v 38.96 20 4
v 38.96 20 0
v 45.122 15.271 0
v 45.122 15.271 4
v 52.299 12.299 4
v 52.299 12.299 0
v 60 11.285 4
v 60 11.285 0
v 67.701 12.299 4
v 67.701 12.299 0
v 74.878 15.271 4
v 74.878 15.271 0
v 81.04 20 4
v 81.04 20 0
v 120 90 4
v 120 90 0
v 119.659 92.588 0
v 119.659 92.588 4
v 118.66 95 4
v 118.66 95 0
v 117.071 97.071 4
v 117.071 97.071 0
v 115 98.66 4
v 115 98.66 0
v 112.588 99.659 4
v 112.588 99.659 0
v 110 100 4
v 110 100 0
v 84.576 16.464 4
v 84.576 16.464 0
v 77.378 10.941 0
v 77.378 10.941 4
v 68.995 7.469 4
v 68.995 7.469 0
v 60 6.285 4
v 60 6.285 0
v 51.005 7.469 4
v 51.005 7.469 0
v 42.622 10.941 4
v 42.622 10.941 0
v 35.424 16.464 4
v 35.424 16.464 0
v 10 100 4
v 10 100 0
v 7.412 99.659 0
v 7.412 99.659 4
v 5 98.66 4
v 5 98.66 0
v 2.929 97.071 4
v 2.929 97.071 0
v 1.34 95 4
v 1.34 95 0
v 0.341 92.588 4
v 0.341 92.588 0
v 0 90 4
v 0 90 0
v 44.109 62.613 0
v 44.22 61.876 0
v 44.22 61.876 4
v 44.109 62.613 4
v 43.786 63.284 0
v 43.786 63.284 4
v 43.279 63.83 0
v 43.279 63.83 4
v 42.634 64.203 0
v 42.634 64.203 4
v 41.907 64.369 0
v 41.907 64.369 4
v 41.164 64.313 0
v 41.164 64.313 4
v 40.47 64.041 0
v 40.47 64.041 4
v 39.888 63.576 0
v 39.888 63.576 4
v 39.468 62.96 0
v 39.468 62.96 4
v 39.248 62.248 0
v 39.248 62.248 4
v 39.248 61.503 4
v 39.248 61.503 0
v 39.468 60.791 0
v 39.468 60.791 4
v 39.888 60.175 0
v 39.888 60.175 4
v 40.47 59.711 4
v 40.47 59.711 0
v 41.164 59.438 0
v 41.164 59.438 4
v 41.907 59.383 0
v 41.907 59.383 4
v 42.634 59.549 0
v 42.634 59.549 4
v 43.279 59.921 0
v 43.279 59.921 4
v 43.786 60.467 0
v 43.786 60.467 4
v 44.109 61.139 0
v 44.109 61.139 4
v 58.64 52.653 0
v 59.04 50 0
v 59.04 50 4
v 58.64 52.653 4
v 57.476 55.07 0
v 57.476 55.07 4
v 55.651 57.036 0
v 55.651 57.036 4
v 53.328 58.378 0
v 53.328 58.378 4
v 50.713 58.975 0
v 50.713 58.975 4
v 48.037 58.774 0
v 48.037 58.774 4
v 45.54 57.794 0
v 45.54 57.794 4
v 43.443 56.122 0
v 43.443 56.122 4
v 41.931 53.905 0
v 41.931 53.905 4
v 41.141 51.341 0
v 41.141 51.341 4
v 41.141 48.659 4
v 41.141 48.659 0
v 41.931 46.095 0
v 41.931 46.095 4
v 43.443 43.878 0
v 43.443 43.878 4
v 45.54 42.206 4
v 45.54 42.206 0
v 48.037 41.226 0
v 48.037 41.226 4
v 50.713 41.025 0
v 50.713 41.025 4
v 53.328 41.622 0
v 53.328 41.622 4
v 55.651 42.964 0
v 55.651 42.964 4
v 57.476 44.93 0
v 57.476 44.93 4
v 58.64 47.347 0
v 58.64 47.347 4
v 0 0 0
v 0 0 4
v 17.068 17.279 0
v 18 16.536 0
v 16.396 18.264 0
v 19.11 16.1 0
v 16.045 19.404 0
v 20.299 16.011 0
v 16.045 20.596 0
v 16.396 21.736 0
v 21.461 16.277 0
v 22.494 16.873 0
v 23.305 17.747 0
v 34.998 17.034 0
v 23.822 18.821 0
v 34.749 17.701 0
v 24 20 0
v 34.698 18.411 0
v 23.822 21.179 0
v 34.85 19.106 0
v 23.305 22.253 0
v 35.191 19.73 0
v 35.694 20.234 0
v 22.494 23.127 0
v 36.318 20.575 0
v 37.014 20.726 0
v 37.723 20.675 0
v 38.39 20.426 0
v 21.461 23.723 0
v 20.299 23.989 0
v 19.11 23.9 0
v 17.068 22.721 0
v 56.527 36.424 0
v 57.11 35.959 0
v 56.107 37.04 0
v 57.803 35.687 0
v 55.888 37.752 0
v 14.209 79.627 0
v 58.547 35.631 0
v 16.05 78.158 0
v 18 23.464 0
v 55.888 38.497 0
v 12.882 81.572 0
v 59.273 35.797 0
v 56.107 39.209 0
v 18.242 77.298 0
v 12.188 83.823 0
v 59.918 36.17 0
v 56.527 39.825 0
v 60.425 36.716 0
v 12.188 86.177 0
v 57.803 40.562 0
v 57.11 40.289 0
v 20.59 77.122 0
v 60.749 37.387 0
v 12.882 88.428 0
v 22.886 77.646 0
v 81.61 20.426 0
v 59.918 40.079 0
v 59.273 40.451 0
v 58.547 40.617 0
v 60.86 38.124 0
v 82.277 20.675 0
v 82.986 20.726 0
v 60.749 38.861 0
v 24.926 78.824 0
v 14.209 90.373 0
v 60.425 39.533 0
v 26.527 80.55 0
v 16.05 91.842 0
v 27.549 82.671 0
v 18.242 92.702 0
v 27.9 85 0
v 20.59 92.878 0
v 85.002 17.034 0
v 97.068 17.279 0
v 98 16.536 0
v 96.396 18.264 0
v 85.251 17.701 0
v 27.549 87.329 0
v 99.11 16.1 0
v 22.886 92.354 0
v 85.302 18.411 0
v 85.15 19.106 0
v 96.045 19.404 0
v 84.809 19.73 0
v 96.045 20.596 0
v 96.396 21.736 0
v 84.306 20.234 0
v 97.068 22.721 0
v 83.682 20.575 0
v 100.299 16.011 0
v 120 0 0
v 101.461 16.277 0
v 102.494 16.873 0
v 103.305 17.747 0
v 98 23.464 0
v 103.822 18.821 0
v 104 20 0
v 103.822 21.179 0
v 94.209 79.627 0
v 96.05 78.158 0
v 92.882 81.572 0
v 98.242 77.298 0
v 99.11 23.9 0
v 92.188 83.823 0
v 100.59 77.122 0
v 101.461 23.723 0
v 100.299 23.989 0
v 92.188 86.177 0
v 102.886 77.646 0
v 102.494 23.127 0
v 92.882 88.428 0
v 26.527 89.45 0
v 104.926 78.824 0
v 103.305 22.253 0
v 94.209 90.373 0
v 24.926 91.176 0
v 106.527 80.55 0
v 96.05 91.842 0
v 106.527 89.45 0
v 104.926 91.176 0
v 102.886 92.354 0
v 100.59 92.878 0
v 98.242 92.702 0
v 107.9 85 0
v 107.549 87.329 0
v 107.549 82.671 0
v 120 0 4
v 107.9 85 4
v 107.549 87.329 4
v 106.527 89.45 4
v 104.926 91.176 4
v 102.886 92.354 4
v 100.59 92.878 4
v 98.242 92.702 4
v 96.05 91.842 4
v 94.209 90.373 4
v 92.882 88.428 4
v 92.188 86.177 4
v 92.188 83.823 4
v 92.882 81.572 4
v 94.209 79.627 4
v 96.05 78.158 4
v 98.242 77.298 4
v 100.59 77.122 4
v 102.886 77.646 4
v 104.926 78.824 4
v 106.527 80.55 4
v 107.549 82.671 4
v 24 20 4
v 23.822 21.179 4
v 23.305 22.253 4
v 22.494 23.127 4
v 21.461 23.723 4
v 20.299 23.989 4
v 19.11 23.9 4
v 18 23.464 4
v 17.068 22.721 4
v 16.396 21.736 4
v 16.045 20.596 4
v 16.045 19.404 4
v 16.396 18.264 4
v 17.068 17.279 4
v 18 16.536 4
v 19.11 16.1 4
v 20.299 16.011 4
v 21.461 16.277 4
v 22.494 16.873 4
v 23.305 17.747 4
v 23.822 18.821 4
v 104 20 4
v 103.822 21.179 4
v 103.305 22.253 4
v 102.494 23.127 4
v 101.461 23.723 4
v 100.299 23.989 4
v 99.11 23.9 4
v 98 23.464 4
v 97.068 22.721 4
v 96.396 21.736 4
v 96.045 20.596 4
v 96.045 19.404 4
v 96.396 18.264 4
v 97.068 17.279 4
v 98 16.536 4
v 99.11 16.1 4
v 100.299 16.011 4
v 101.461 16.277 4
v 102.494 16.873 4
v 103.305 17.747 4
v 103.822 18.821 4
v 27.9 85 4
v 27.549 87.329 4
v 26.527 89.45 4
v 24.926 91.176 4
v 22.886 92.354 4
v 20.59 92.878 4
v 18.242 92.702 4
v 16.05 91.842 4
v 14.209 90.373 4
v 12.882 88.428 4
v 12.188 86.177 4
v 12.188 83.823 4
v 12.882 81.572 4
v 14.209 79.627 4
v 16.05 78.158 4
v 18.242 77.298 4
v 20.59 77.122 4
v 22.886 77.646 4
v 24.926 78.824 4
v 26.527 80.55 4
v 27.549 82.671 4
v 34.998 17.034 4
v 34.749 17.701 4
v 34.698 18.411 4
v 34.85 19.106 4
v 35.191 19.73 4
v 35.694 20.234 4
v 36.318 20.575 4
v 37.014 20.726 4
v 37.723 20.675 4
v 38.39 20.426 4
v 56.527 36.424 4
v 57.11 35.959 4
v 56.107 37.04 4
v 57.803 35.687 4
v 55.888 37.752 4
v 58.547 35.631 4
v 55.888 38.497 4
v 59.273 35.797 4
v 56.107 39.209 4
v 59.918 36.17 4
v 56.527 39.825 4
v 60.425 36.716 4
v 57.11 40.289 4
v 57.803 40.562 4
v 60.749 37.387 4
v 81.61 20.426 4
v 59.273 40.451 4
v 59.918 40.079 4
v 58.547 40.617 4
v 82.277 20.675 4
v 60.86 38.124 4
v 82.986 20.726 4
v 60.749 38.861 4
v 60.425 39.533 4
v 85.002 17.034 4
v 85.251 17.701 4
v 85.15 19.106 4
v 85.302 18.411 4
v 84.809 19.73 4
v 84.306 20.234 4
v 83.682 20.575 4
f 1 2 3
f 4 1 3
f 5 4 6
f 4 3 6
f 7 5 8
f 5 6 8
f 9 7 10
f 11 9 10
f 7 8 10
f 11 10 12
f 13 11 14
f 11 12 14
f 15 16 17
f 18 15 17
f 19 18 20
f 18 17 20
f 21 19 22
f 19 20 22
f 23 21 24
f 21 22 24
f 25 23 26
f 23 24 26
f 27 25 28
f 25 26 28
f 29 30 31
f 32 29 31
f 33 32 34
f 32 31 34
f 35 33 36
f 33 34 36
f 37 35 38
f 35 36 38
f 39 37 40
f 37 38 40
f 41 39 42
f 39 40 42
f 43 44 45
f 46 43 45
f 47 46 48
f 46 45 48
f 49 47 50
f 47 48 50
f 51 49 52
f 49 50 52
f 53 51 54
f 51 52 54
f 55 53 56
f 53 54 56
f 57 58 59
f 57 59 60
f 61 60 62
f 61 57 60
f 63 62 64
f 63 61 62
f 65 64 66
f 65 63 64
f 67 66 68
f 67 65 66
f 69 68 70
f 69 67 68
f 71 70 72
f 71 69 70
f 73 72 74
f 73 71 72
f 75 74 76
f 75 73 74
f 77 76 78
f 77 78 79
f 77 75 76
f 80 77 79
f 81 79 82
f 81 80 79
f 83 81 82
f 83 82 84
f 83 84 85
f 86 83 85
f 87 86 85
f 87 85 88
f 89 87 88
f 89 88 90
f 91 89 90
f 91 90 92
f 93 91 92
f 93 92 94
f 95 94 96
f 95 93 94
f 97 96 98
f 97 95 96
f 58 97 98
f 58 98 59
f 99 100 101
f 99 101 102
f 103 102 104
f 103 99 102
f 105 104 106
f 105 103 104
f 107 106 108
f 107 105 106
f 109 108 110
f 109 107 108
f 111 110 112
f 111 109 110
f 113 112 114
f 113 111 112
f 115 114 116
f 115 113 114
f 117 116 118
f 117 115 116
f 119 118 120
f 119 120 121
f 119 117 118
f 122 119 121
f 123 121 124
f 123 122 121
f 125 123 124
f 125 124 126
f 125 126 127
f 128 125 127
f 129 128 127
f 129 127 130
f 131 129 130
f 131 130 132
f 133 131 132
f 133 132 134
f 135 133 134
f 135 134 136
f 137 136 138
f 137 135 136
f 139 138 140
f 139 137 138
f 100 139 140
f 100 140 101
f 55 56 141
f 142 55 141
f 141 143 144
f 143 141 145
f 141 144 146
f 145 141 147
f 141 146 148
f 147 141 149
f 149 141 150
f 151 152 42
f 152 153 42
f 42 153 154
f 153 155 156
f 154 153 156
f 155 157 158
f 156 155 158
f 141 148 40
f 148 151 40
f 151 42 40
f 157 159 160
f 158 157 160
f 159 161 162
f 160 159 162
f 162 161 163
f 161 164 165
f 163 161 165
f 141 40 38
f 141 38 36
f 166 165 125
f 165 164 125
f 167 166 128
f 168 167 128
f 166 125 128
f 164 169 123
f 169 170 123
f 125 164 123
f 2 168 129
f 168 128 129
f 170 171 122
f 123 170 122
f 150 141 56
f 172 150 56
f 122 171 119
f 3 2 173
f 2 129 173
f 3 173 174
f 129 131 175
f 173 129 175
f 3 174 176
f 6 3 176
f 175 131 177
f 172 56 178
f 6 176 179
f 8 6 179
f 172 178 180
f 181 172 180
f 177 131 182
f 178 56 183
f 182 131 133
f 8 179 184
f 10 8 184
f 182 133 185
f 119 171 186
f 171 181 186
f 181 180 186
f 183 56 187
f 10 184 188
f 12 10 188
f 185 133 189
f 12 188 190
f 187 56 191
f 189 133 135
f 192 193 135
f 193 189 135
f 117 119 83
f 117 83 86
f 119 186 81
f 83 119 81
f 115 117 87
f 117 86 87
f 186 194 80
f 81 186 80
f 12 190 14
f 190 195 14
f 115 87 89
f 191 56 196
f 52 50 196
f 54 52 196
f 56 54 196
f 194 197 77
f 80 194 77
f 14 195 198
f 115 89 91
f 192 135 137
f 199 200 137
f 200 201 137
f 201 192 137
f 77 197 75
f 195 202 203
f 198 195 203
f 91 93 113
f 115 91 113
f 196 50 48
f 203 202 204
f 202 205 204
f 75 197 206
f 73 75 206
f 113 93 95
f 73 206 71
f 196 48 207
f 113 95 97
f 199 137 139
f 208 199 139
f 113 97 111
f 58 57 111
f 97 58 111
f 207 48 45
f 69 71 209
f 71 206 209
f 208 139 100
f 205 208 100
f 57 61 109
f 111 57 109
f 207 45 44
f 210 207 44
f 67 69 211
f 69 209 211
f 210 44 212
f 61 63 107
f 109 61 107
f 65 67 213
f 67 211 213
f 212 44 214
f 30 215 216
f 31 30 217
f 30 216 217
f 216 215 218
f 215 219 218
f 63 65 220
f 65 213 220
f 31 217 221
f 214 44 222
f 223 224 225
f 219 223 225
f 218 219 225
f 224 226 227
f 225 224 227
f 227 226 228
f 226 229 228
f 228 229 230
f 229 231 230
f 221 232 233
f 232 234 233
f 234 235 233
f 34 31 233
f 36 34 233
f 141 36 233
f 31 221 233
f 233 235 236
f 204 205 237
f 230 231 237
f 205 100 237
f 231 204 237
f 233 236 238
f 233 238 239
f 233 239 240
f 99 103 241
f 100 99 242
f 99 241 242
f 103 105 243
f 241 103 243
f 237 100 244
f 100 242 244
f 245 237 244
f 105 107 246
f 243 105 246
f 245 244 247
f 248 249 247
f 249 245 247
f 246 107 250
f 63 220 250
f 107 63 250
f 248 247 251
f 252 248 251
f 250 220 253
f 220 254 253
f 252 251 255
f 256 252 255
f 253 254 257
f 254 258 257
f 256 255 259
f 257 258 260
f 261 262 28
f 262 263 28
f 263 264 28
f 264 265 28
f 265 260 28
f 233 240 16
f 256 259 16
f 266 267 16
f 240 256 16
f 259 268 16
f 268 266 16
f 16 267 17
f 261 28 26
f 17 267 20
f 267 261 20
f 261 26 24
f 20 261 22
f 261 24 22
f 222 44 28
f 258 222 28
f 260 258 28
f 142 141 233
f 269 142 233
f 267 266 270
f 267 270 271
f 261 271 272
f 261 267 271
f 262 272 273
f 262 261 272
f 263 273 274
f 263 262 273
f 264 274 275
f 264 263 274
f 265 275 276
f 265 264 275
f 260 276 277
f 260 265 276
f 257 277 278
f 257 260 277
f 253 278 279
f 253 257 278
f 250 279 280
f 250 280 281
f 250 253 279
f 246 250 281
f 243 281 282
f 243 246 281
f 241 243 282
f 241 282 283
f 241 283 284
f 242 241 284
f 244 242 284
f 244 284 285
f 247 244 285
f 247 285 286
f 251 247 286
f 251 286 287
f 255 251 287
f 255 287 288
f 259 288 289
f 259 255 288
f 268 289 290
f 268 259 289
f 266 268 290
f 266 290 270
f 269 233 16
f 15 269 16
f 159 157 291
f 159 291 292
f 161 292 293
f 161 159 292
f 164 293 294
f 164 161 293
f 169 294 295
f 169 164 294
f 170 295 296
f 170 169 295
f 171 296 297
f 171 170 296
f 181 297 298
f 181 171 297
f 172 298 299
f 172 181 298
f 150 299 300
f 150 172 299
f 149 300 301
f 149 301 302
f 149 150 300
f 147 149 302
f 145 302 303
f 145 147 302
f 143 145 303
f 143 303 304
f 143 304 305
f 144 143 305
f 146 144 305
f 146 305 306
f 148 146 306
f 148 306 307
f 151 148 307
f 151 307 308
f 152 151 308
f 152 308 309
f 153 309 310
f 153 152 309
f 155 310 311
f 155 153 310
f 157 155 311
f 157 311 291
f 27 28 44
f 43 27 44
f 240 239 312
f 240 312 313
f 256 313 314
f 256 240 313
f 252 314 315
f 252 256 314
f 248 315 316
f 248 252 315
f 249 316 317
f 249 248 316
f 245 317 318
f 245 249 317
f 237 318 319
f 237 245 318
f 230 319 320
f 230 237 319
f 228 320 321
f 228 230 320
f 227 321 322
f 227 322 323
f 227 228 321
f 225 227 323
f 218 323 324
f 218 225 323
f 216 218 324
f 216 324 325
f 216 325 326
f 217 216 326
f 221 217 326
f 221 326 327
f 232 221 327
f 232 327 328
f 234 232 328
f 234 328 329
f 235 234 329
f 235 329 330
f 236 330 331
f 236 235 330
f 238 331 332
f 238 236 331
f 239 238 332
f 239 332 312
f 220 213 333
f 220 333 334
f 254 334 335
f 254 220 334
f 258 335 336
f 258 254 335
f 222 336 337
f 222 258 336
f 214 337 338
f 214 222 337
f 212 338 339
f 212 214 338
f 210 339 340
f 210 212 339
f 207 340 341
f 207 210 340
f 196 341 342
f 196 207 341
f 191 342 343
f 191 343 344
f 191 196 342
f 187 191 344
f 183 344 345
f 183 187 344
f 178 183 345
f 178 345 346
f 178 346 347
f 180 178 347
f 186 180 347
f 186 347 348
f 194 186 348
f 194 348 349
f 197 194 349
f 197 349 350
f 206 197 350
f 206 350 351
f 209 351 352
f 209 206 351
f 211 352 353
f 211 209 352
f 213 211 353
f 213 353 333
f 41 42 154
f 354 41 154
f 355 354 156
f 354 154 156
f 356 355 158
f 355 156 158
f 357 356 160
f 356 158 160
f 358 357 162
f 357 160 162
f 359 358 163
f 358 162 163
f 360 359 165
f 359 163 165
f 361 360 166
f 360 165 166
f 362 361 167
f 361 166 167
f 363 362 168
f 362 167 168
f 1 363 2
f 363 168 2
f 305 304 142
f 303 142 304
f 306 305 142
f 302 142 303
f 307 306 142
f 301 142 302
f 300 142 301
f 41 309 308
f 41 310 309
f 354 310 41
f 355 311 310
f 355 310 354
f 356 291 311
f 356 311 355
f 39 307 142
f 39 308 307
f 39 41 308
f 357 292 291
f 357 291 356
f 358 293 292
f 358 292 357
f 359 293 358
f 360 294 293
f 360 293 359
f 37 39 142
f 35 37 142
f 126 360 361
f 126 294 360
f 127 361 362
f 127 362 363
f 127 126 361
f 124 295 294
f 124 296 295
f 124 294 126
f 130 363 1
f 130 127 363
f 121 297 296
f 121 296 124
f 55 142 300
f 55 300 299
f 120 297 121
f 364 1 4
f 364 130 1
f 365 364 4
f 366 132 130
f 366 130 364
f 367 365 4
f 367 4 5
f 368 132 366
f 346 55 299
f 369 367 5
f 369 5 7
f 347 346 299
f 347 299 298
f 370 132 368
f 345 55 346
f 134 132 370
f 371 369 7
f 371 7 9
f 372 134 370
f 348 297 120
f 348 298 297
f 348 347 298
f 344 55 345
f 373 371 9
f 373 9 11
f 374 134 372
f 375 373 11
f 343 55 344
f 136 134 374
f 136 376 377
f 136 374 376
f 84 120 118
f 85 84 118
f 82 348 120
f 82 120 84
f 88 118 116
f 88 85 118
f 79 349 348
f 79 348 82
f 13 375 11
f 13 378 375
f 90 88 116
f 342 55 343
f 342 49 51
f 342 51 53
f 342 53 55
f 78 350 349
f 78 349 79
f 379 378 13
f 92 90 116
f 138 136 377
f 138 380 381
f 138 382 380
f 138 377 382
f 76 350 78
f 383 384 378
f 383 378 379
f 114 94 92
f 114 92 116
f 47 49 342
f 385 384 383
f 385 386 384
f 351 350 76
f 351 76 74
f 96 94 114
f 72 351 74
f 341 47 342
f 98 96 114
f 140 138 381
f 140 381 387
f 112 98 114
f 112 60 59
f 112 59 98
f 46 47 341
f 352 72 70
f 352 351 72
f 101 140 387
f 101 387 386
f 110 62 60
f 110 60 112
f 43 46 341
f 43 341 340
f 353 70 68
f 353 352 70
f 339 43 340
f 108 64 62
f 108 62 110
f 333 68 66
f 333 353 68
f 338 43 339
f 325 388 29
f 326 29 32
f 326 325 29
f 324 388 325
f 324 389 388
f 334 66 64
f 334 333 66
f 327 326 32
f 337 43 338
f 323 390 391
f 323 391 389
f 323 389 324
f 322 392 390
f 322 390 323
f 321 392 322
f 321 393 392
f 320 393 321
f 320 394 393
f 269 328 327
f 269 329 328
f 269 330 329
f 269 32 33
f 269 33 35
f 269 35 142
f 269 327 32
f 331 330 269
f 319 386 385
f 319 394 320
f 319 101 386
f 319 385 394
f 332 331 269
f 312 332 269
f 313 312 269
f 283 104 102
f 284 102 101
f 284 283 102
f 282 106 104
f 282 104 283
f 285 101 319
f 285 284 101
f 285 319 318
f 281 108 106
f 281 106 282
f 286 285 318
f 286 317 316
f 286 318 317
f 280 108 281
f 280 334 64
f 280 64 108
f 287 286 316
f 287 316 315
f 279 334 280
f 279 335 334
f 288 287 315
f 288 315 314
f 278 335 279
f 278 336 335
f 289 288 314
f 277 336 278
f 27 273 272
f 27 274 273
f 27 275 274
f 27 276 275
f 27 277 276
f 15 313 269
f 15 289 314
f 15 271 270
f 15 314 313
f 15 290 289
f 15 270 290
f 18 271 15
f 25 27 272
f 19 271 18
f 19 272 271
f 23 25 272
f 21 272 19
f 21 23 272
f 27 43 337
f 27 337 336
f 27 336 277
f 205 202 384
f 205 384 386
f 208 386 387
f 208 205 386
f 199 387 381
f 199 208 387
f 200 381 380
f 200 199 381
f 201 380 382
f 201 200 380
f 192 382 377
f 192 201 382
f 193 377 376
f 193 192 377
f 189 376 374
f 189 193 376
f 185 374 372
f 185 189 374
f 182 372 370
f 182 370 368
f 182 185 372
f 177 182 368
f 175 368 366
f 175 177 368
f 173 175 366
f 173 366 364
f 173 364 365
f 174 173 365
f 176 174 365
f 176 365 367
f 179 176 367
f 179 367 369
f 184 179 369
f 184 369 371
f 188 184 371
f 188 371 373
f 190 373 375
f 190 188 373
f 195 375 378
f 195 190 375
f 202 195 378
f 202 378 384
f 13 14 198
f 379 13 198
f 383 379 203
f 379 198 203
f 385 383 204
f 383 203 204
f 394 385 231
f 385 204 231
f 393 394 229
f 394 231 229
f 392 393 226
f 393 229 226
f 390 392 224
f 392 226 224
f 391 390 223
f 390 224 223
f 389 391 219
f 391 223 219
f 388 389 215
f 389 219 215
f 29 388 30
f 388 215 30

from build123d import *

# Parameters (mm, degrees)
SKETCH1_R           = 7.9
SKETCH1_R_2         = 9
SKETCH1_R_3         = 2.5
SKETCH1_R_4         = 4
BOSS_EXTRUDE1_DEPTH = 4


with BuildPart() as part:
    # Sketch1 → Boss-Extrude1 (new body)
    with BuildSketch(Plane.XY):
        with BuildLine():
            Line((0, 0), (120, 0))
            Line((120, 0), (120, 90))
            ThreePointArc((120, 90), (117.071067812, 97.071067812), (110, 100))
            Line((110, 100), (10, 100))
            ThreePointArc((10, 100), (2.928932188, 97.071067812), (0, 90))
            Line((0, 90), (0, 0))
        make_face()
        with Locations((100, 85)):
            Circle(SKETCH1_R, mode=Mode.SUBTRACT)
        with Locations((20, 85)):
            Circle(SKETCH1_R, mode=Mode.SUBTRACT)
        with Locations((50.040016013, 50)):
            Circle(SKETCH1_R_2, mode=Mode.SUBTRACT)
        with Locations((58.359688144, 38.124266101)):
            Circle(SKETCH1_R_3, mode=Mode.SUBTRACT)
        with Locations((41.720343882, 61.875733899)):
            Circle(SKETCH1_R_3, mode=Mode.SUBTRACT)
        with Locations((100, 20)):
            Circle(SKETCH1_R_4, mode=Mode.SUBTRACT)
        with Locations((20, 20)):
            Circle(SKETCH1_R_4, mode=Mode.SUBTRACT)
        with BuildLine():
            ThreePointArc((38.959835733, 20), (60, 11.284878606), (81.040164267, 20))
            ThreePointArc((81.040164267, 20), (84.575698173, 20), (84.575698173, 16.464466094))
            ThreePointArc((84.575698173, 16.464466094), (60, 6.284878606), (35.424301827, 16.464466094))
            ThreePointArc((35.424301827, 16.464466094), (35.424301827, 20), (38.959835733, 20))
        make_face(mode=Mode.SUBTRACT)
    extrude(amount=BOSS_EXTRUDE1_DEPTH)


solid = part.part
